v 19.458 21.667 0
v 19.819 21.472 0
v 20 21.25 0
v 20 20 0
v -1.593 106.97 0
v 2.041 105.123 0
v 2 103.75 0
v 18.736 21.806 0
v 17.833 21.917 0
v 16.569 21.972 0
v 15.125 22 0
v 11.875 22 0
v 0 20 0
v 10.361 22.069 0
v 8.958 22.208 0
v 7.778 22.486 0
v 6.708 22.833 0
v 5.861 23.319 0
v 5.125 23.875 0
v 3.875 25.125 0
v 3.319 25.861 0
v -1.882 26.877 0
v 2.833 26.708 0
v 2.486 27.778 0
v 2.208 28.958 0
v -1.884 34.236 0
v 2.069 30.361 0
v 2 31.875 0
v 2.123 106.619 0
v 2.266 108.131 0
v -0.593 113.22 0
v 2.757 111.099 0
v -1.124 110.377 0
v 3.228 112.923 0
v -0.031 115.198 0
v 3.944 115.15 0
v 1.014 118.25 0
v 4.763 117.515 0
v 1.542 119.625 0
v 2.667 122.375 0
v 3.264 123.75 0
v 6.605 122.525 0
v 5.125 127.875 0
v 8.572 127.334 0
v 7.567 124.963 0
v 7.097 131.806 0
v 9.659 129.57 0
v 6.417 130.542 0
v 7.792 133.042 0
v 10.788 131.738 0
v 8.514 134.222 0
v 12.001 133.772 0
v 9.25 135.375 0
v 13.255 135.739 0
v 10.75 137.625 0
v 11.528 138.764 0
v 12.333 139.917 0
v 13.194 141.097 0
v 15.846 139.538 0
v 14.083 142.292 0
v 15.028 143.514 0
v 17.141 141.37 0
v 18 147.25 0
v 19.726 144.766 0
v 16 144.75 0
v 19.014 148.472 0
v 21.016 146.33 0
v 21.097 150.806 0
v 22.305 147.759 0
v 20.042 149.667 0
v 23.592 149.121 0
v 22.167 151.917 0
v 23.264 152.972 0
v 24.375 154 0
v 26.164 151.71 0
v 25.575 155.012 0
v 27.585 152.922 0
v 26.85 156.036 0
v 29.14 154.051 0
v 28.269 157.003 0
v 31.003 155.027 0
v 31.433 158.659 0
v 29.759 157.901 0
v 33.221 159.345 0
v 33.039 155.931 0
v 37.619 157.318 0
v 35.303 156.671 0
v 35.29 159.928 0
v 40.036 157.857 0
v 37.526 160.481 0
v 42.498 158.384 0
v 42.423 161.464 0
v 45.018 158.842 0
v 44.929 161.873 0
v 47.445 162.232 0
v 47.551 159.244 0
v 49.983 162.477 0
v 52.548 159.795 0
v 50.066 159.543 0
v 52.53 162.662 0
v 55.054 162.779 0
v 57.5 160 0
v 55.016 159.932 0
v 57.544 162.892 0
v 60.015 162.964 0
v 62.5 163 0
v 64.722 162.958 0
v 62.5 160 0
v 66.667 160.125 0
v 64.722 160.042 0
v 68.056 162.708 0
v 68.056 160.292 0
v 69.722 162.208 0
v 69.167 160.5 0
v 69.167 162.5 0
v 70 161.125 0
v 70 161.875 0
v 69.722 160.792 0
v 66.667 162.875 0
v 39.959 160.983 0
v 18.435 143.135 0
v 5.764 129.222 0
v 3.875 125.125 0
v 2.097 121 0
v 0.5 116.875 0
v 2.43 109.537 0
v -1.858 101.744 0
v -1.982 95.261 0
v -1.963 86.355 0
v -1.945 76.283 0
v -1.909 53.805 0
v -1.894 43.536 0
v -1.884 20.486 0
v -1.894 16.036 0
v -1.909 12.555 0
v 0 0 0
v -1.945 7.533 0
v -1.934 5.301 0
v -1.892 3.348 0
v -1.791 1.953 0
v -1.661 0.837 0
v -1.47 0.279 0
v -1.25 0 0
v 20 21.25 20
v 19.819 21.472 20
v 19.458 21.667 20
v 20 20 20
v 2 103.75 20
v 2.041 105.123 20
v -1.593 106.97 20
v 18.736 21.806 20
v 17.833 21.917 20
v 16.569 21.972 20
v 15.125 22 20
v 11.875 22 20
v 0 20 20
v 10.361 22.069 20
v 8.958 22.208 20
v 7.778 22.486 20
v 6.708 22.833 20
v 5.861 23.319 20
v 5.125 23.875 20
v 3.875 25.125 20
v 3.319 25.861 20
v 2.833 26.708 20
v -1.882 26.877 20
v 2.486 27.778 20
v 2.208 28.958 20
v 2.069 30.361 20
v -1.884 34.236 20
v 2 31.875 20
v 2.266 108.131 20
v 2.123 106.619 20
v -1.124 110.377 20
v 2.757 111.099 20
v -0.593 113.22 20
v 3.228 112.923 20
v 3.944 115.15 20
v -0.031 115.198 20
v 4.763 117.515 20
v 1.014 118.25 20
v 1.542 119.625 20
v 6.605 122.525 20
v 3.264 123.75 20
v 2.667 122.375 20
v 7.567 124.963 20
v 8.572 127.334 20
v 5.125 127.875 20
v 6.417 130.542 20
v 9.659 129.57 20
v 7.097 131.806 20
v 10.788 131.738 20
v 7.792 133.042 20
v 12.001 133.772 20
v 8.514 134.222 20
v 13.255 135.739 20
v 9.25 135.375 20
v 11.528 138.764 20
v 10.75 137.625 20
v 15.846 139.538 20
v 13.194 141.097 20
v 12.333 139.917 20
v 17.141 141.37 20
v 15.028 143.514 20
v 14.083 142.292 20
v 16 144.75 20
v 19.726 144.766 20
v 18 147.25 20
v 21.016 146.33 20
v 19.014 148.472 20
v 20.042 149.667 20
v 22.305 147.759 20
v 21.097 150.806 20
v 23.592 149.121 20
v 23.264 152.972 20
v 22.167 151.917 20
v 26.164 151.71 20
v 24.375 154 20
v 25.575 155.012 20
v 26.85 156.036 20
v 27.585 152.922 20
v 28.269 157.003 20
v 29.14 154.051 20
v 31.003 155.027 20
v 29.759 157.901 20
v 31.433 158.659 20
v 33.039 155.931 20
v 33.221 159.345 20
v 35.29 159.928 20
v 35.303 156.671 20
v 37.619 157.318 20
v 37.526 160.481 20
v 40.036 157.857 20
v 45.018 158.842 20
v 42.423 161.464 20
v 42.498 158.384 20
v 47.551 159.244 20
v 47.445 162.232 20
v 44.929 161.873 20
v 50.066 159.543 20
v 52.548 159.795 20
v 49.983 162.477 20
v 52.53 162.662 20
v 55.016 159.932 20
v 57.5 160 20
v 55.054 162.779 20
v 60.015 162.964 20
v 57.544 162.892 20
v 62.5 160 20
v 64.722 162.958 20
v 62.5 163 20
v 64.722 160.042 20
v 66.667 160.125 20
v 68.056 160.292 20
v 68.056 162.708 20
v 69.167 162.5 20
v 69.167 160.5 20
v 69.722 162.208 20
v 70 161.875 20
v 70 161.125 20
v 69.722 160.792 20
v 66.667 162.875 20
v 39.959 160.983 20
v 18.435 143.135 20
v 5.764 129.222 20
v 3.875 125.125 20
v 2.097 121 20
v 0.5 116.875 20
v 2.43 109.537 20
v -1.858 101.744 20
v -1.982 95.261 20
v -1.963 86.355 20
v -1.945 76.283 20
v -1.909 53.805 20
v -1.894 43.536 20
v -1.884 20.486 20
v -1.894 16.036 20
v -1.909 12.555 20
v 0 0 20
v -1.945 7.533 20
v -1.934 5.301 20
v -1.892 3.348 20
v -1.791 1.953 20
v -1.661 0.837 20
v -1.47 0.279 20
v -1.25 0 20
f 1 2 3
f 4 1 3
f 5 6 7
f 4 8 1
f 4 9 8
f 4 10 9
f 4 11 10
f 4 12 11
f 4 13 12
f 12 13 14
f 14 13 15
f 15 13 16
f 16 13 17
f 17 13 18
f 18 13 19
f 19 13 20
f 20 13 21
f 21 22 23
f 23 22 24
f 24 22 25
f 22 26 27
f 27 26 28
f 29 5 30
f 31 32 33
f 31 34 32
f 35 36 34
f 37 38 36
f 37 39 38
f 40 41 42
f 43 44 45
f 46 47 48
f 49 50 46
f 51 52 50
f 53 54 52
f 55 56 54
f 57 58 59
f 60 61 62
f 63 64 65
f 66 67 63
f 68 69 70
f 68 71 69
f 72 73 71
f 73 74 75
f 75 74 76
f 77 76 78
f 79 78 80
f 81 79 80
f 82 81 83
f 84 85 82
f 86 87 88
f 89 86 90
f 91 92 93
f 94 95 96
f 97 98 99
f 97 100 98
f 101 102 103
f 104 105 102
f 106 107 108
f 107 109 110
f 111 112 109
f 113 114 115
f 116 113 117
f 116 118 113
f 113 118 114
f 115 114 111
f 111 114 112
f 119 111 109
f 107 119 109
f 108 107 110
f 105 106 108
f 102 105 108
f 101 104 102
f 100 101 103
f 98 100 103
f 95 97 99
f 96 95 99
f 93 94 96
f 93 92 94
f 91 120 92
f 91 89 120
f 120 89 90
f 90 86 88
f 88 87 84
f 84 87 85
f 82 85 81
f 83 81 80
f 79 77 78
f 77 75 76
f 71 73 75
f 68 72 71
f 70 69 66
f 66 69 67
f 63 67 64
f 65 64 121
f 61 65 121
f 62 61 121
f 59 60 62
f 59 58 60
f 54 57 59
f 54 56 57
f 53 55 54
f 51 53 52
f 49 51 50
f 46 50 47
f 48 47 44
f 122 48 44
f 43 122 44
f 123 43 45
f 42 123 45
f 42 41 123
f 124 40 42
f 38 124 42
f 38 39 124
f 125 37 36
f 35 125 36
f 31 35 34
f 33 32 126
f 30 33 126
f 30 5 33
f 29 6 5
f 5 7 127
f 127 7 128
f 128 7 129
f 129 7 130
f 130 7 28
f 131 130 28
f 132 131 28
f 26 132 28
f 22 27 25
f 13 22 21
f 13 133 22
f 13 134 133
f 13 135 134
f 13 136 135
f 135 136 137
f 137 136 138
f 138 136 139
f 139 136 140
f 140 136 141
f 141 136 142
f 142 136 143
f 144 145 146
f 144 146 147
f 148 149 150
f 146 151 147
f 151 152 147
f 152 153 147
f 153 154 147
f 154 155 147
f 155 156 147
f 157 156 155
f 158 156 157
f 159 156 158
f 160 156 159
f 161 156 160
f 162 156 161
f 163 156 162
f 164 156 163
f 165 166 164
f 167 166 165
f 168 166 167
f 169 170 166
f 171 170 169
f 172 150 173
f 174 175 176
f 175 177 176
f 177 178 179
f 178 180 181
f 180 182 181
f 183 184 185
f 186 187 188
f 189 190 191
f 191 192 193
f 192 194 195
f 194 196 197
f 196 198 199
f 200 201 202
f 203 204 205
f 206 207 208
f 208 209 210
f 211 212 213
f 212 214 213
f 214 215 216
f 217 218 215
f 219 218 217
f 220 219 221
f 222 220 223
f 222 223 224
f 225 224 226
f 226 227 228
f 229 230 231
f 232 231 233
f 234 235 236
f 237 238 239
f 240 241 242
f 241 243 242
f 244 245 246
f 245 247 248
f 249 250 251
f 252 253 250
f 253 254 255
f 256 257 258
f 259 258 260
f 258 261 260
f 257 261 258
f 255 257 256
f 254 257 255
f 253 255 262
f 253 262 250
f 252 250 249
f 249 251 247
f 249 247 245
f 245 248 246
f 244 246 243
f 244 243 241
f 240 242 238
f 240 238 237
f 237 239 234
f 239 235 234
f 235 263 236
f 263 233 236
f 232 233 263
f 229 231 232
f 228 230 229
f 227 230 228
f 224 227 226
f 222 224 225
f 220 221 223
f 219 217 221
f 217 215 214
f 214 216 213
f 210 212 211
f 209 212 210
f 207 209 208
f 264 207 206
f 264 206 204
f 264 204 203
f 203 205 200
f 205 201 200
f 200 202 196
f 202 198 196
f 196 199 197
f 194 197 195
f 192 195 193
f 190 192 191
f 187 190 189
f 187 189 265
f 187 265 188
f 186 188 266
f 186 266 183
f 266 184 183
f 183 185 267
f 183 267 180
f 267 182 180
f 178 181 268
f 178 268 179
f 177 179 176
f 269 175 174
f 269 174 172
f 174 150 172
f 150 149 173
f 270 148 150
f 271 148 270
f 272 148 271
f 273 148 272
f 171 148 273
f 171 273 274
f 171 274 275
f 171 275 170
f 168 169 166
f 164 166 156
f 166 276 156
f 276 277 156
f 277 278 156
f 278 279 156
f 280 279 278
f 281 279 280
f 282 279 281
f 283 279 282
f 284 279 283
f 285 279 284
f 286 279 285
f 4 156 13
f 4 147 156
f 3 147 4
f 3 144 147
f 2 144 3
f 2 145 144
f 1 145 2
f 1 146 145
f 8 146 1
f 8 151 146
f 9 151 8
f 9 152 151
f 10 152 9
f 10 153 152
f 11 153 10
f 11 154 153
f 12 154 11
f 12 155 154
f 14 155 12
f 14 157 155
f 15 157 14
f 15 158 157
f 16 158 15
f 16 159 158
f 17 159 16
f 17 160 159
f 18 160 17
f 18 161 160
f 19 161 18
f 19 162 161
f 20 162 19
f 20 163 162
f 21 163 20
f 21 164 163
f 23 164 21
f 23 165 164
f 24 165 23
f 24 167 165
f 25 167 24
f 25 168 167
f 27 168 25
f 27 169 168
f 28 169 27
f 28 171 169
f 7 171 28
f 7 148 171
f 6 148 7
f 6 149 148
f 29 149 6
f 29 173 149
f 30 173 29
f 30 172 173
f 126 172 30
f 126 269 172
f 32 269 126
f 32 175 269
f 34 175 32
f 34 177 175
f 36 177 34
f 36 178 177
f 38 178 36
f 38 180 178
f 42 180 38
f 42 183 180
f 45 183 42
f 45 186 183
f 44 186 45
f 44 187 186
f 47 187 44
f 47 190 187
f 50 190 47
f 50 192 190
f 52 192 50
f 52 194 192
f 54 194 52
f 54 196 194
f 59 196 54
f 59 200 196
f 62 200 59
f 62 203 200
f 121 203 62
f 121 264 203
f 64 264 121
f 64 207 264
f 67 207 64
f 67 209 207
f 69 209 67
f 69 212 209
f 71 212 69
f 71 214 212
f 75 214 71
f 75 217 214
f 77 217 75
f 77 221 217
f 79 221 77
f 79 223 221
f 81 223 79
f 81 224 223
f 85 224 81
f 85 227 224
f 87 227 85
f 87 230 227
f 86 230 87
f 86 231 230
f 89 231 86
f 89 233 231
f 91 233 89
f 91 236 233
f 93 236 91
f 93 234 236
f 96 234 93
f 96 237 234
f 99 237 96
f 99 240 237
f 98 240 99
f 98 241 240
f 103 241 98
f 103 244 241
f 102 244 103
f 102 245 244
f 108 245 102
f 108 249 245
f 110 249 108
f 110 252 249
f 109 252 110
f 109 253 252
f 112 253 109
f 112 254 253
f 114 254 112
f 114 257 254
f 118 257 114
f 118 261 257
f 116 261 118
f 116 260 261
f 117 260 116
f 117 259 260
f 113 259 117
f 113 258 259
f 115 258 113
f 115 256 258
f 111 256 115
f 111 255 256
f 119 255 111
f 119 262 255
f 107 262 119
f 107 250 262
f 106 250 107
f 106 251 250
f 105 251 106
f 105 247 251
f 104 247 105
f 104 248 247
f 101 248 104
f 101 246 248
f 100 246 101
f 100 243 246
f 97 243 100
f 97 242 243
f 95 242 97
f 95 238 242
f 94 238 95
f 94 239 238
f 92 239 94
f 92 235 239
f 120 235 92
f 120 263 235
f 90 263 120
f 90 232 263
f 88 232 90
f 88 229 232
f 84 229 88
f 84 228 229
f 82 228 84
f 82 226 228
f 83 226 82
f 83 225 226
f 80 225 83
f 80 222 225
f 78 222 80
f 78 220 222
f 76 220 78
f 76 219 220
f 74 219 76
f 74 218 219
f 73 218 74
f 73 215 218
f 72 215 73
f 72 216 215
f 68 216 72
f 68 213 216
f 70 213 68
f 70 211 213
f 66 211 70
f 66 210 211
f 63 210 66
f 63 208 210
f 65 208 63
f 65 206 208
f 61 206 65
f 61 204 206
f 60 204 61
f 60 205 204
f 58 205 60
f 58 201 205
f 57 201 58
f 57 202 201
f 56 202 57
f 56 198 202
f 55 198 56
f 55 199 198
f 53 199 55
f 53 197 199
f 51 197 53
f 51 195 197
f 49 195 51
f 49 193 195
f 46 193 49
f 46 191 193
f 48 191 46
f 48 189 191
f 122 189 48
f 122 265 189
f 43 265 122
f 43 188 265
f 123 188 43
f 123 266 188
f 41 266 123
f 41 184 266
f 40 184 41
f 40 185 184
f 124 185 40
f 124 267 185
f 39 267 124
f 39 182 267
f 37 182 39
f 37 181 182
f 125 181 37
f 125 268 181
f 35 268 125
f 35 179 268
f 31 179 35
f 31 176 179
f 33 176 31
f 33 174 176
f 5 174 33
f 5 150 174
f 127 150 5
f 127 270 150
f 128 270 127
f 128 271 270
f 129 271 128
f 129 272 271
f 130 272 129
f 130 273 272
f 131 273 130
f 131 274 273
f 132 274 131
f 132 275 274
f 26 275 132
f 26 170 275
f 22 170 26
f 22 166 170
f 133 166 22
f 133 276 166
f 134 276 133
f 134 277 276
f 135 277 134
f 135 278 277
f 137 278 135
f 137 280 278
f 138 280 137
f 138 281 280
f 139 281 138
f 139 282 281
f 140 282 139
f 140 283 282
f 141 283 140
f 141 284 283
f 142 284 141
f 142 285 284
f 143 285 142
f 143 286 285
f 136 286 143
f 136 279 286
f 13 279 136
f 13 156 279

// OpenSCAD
linear_extrude(20)polygon([[17.666666666666668,20],[19,20],[20,20],[20,20.5],[20,20.916666666666668],[20,21.25],[19.819444444444446,21.472222222222218],[19.458333333333336,21.666666666666664],[18.73611111111111,21.805555555555554],[17.833333333333336,21.916666666666664],[16.569444444444446,21.972222222222218],[15.125,22],[13.5,22],[11.875,22],[10.361111111111112,22.069444444444446],[8.958333333333334,22.208333333333336],[7.777777777777779,22.486111111111114],[6.708333333333334,22.833333333333336],[5.861111111111112,23.319444444444446],[5.125,23.875],[4.5,24.5],[3.875,25.125],[3.319444444444444,25.861111111111114],[2.833333333333333,26.708333333333336],[2.486111111111111,27.777777777777782],[2.208333333333333,28.958333333333336],[2.069444444444444,30.361111111111114],[2,31.875],[2,33.5],[2,35.125],[2,36.84722222222222],[2,38.66666666666667],[2,40.68055555555556],[2,42.79166666666667],[2,45.09722222222223],[2,47.5],[2,50],[2,52.5],[2,55],[2,57.5],[2,60],[2,62.5],[2,65],[2,67.5],[2,70],[2,72.5],[2,74.86111111111111],[2,77.08333333333334],[2,79.02777777777779],[2,80.83333333333334],[2,82.36111111111111],[2,83.75],[2,85],[2,86.25],[2,87.5],[2,88.75],[2,90],[2,91.25],[2,92.5],[2,93.75],[2,95],[2,96.25],[2,97.5],[2,98.75],[2,100],[2,101.25],[2,102.5],[2,103.75],[2.0409885096048925,105.12297759443175],[2.122965528814677,106.61893278329524],[2.266282795506174,108.13136265417161],[2.429951800074491,109.53728961262911],[2.7572898092111253,111.09914352954415],[3.2279450850392566,112.92342731733555],[3.94424638464549,115.14959325244796],[4.762876441338328,117.51521146400499],[5.683835255117771,120.02028195200666],[6.604794068897213,122.52535244000832],[7.567394641652761,124.96313645795954],[8.571636973384415,127.33363400586029],[9.65916282306828,129.56955861366012],[10.788330431728252,131.73819675140953],[12.000781558340433,133.77226194905805],[13.25487444392872,135.7390406766561],[14.550609088493113,137.63853293420368],[15.846343733057505,139.53802519175127],[17.14101192935477,141.37031595428337],[18.434613677384903,143.13540522179994],[19.72608252888077,144.76609149928552],[21.016484932109506,146.32957628175558],[22.304754438803982,147.75865807419467],[23.591957497231327,149.12053837161824],[24.878094107391536,150.4152171740263],[26.164230717551753,151.70989597643438],[27.584926585638158,152.92191696213516],[29.140181711650758,154.0512801311287],[31.00318734441247,155.02686864063392],[33.03938422599711,155.93134030735814],[35.30254781221302,156.6711892895998],[37.619486854237294,157.31753243013986],[40.03587298361541,157.85744285718823],[42.49793074453902,158.3844264124465],[45.01829557996243,158.8424350174447],[47.551295858340154,159.24439554397298],[50.06556440928282,159.54328584400668],[52.5484657898361,159.7951539960157],[55.0161552632787,159.9317179986719],[57.5,160],[60,160],[62.5,160],[64.72222222222221,160.04166666666666],[66.66666666666666,160.125],[68.05555555555556,160.29166666666666],[69.16666666666666,160.5],[69.72222222222221,160.79166666666666],[70,161.125],[70,161.5],[70,161.875],[69.72222222222221,162.20833333333334],[69.16666666666666,162.5],[68.05555555555556,162.70833333333334],[66.66666666666666,162.875],[64.72222222222221,162.95833333333334],[62.5,163],[60.0146515783077,162.96407984199786],[57.543954734923076,162.89223952599352],[55.05396583530041,162.77944829896413],[52.530033301132,162.66162631891183],[49.98255500302238,162.477347219299],[47.44547457551728,162.23164175314855],[44.92918988922124,161.87332128167918],[42.42330307352974,161.46381217142846],[39.95900774025635,160.98263896688385],[37.52590601879653,160.4809903068267],[35.29036383882278,159.92815300798821],[33.221187588521495,159.34460252588093],[31.43275384454249,158.65867476621096],[29.758696677213308,157.90108291224715],[28.26907360233808,157.00294111941045],[26.849508043266972,156.03591348199473],[25.574836014422328,155.0119711606649],[24.375,154],[23.263888888888886,152.97222222222223],[22.166666666666664,151.91666666666669],[21.09722222222222,150.80555555555557],[20.041666666666664,149.66666666666669],[19.01388888888889,148.47222222222223],[18,147.25],[17,146],[16,144.75],[15.027777777777777,143.51388888888889],[14.083333333333332,142.29166666666669],[13.194444444444443,141.09722222222223],[12.333333333333332,139.91666666666669],[11.527777777777777,138.76388888888889],[10.75,137.625],[10,136.5],[9.25,135.375],[8.513888888888888,134.22222222222223],[7.791666666666666,133.04166666666669],[7.097222222222221,131.80555555555557],[6.416666666666666,130.54166666666669],[5.763888888888888,129.22222222222223],[5.125,127.875],[4.5,126.5],[3.875,125.125],[3.2638888888888893,123.75],[2.666666666666667,122.375],[2.0972222222222223,121],[1.5416666666666667,119.625],[1.013888888888889,118.25],[0.5,116.875],[-0.030894373644207107,115.19843761570753],[-0.5926831209326213,113.22031284712261],[-1.1235774945768284,110.37708379616349],[-1.5926831209326213,106.97031284712261],[-1.8581365546063207,101.74377839115535],[-1.9817265428863402,95.26102232634341],[-1.9634530857726802,86.35537798602013],[-1.9451796286590206,76.2830669790302],[-1.9269061715453608,65.04408930537359],[-1.908632714431701,53.805111631717],[-1.8944200255655208,43.53590677442853],[-1.884268104946821,34.2364747335082],[-1.8822377208230812,26.876588325324136],[-1.884268104946821,20.4864747335082],[-1.8944200255655212,16.035906774428536],[-1.908632714431701,12.555111631717],[-1.9269061715453608,10.044089305373602],[-1.9451796286590206,7.533066979030201],[-1.9336449238711628,5.301047133391623],[-1.892302057181787,3.3480297684578666],[-1.7913428666893758,1.9530173649337554],[-1.6605755142954468,0.8370074421144666],[-1.4701918380984822,0.2790024807048222],[-1.25,0],[-0.9166666666666666,0],[-0.5,0],[0,0],[0,1],[0,2.1666666666666665],[0,3.5],[0,5.333333333333333],[0,7.5],[0,10],[0,12.5],[0,15],[0,17.5],[0,20],[1.5,20],[3.5,20],[6,20],[8.833333333333334,20],[11.5,20],[13.833333333333334,20],[16,20],]);
